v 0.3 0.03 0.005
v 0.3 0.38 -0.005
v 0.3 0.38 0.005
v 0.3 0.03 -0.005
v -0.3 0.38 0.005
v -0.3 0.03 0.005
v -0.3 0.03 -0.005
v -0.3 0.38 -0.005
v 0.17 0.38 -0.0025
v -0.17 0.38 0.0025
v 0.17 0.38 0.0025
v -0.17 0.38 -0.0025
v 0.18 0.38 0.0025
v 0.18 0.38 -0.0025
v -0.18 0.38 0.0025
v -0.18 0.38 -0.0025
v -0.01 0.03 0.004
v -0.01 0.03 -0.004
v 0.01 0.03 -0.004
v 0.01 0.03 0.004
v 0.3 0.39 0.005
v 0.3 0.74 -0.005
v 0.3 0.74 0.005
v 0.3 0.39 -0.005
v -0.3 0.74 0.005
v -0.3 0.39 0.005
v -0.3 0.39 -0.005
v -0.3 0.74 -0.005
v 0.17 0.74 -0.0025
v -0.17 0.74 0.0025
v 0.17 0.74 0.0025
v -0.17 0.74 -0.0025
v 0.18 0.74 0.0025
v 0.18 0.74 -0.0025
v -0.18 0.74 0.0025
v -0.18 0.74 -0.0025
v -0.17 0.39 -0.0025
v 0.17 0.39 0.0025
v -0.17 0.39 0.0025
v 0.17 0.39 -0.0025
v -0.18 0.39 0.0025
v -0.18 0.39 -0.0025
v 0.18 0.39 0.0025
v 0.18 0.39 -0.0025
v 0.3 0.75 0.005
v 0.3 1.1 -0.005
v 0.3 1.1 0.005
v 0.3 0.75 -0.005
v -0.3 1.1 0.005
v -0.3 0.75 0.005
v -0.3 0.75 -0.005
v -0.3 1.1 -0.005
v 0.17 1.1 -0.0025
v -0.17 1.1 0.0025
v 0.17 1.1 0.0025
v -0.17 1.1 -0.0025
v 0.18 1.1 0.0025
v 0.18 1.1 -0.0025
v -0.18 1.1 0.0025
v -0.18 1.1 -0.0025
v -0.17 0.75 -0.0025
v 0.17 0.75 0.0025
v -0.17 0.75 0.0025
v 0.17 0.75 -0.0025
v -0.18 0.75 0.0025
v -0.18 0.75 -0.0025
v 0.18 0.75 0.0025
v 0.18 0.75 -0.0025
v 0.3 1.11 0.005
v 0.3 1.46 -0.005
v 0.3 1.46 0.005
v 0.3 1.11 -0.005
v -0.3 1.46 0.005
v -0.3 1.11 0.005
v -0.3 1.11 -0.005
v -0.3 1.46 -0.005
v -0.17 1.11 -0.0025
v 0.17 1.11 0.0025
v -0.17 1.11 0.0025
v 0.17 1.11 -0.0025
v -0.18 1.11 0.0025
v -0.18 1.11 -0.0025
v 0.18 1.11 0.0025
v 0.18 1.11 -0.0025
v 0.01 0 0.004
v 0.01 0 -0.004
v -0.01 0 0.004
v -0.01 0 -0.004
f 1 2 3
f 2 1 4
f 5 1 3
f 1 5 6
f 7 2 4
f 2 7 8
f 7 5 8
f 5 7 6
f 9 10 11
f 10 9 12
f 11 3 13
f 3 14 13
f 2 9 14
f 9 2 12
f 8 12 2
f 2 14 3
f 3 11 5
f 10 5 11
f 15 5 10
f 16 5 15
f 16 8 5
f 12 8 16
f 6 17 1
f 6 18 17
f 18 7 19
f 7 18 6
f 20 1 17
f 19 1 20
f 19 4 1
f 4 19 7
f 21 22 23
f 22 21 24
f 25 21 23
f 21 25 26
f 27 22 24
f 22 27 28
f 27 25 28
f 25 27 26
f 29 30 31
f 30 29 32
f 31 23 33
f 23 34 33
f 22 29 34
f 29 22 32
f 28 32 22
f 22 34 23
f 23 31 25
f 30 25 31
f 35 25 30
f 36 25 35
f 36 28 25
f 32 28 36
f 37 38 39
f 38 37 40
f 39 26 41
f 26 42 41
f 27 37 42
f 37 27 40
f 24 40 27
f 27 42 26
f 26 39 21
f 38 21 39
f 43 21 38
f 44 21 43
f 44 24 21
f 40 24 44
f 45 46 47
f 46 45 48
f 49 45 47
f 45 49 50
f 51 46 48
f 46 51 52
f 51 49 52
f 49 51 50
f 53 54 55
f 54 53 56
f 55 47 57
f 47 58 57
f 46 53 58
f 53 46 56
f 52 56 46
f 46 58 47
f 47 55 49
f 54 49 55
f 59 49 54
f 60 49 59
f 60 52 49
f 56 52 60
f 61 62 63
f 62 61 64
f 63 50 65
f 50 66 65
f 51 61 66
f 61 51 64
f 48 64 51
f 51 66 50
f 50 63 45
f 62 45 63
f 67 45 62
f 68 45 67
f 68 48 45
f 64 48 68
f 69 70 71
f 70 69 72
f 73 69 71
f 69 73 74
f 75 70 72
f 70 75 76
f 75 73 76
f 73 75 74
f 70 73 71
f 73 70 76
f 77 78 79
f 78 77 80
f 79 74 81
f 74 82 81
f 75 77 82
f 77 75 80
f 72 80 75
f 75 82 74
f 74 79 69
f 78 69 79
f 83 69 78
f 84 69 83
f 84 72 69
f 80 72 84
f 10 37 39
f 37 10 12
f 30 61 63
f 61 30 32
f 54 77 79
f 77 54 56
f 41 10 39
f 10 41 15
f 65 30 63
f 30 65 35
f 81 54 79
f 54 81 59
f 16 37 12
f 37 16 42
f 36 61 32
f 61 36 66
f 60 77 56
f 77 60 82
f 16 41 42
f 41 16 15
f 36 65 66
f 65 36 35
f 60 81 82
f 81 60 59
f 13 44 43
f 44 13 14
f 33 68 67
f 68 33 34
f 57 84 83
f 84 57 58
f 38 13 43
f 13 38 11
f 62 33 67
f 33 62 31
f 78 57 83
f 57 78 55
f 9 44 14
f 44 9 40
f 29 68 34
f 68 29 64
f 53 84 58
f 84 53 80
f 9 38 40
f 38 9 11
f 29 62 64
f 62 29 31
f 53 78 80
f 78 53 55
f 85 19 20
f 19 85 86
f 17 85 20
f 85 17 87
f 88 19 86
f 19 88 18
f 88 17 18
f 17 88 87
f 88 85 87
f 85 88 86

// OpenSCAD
module solar_panel(sl=0.25, sw=0.15, sh=0.01, conl=0.1, conh=0.01, hubcl=0.05, hubcw=0.05, hubch=0.01, N=4){
ssep = 0.01;
sep = 0.01;

//cl = (sl-(Nl+1)*sep)/Nl;
//cw = (sw-(Nw+1)*sep)/Nw;
//ch = sh*1.1;

translate([0,hubcw/2,0])
  union(){
    cube([hubcl,hubcw,hubch],center=true);
  translate([-sl/2,0,-sh/2]){
    translate([sl*0.2, 0, -(conh-sh)/2])
      cube([conl,(sw+ssep)*N-ssep,conh]);
    translate([sl*0.8-conl, 0, -(conh-sh)/2])
      cube([conl,(sw+ssep)*N-ssep,conh]);
    for(i=[0:N-1]){
      translate([0, (sw+ssep)*i, 0]){
        cube([sl,sw,sh]);
//        translate([sep, sep, 0])
//          for(i=[0:2])
//            for(j=[0:1])
//              translate([i*(cl+sep), j*(cw+sep), 0])
//                cube([cl,cw,ch]);
        }
    }
  }
  }
}
//rotate([90,0,0])
   color([0.3,0.3,1]) solar_panel(sl=0.6, sw=0.35, sh=0.01, conl=0.01, conh=0.005, hubcl=0.02, hubcw=0.06, hubch=0.008, N=4);
